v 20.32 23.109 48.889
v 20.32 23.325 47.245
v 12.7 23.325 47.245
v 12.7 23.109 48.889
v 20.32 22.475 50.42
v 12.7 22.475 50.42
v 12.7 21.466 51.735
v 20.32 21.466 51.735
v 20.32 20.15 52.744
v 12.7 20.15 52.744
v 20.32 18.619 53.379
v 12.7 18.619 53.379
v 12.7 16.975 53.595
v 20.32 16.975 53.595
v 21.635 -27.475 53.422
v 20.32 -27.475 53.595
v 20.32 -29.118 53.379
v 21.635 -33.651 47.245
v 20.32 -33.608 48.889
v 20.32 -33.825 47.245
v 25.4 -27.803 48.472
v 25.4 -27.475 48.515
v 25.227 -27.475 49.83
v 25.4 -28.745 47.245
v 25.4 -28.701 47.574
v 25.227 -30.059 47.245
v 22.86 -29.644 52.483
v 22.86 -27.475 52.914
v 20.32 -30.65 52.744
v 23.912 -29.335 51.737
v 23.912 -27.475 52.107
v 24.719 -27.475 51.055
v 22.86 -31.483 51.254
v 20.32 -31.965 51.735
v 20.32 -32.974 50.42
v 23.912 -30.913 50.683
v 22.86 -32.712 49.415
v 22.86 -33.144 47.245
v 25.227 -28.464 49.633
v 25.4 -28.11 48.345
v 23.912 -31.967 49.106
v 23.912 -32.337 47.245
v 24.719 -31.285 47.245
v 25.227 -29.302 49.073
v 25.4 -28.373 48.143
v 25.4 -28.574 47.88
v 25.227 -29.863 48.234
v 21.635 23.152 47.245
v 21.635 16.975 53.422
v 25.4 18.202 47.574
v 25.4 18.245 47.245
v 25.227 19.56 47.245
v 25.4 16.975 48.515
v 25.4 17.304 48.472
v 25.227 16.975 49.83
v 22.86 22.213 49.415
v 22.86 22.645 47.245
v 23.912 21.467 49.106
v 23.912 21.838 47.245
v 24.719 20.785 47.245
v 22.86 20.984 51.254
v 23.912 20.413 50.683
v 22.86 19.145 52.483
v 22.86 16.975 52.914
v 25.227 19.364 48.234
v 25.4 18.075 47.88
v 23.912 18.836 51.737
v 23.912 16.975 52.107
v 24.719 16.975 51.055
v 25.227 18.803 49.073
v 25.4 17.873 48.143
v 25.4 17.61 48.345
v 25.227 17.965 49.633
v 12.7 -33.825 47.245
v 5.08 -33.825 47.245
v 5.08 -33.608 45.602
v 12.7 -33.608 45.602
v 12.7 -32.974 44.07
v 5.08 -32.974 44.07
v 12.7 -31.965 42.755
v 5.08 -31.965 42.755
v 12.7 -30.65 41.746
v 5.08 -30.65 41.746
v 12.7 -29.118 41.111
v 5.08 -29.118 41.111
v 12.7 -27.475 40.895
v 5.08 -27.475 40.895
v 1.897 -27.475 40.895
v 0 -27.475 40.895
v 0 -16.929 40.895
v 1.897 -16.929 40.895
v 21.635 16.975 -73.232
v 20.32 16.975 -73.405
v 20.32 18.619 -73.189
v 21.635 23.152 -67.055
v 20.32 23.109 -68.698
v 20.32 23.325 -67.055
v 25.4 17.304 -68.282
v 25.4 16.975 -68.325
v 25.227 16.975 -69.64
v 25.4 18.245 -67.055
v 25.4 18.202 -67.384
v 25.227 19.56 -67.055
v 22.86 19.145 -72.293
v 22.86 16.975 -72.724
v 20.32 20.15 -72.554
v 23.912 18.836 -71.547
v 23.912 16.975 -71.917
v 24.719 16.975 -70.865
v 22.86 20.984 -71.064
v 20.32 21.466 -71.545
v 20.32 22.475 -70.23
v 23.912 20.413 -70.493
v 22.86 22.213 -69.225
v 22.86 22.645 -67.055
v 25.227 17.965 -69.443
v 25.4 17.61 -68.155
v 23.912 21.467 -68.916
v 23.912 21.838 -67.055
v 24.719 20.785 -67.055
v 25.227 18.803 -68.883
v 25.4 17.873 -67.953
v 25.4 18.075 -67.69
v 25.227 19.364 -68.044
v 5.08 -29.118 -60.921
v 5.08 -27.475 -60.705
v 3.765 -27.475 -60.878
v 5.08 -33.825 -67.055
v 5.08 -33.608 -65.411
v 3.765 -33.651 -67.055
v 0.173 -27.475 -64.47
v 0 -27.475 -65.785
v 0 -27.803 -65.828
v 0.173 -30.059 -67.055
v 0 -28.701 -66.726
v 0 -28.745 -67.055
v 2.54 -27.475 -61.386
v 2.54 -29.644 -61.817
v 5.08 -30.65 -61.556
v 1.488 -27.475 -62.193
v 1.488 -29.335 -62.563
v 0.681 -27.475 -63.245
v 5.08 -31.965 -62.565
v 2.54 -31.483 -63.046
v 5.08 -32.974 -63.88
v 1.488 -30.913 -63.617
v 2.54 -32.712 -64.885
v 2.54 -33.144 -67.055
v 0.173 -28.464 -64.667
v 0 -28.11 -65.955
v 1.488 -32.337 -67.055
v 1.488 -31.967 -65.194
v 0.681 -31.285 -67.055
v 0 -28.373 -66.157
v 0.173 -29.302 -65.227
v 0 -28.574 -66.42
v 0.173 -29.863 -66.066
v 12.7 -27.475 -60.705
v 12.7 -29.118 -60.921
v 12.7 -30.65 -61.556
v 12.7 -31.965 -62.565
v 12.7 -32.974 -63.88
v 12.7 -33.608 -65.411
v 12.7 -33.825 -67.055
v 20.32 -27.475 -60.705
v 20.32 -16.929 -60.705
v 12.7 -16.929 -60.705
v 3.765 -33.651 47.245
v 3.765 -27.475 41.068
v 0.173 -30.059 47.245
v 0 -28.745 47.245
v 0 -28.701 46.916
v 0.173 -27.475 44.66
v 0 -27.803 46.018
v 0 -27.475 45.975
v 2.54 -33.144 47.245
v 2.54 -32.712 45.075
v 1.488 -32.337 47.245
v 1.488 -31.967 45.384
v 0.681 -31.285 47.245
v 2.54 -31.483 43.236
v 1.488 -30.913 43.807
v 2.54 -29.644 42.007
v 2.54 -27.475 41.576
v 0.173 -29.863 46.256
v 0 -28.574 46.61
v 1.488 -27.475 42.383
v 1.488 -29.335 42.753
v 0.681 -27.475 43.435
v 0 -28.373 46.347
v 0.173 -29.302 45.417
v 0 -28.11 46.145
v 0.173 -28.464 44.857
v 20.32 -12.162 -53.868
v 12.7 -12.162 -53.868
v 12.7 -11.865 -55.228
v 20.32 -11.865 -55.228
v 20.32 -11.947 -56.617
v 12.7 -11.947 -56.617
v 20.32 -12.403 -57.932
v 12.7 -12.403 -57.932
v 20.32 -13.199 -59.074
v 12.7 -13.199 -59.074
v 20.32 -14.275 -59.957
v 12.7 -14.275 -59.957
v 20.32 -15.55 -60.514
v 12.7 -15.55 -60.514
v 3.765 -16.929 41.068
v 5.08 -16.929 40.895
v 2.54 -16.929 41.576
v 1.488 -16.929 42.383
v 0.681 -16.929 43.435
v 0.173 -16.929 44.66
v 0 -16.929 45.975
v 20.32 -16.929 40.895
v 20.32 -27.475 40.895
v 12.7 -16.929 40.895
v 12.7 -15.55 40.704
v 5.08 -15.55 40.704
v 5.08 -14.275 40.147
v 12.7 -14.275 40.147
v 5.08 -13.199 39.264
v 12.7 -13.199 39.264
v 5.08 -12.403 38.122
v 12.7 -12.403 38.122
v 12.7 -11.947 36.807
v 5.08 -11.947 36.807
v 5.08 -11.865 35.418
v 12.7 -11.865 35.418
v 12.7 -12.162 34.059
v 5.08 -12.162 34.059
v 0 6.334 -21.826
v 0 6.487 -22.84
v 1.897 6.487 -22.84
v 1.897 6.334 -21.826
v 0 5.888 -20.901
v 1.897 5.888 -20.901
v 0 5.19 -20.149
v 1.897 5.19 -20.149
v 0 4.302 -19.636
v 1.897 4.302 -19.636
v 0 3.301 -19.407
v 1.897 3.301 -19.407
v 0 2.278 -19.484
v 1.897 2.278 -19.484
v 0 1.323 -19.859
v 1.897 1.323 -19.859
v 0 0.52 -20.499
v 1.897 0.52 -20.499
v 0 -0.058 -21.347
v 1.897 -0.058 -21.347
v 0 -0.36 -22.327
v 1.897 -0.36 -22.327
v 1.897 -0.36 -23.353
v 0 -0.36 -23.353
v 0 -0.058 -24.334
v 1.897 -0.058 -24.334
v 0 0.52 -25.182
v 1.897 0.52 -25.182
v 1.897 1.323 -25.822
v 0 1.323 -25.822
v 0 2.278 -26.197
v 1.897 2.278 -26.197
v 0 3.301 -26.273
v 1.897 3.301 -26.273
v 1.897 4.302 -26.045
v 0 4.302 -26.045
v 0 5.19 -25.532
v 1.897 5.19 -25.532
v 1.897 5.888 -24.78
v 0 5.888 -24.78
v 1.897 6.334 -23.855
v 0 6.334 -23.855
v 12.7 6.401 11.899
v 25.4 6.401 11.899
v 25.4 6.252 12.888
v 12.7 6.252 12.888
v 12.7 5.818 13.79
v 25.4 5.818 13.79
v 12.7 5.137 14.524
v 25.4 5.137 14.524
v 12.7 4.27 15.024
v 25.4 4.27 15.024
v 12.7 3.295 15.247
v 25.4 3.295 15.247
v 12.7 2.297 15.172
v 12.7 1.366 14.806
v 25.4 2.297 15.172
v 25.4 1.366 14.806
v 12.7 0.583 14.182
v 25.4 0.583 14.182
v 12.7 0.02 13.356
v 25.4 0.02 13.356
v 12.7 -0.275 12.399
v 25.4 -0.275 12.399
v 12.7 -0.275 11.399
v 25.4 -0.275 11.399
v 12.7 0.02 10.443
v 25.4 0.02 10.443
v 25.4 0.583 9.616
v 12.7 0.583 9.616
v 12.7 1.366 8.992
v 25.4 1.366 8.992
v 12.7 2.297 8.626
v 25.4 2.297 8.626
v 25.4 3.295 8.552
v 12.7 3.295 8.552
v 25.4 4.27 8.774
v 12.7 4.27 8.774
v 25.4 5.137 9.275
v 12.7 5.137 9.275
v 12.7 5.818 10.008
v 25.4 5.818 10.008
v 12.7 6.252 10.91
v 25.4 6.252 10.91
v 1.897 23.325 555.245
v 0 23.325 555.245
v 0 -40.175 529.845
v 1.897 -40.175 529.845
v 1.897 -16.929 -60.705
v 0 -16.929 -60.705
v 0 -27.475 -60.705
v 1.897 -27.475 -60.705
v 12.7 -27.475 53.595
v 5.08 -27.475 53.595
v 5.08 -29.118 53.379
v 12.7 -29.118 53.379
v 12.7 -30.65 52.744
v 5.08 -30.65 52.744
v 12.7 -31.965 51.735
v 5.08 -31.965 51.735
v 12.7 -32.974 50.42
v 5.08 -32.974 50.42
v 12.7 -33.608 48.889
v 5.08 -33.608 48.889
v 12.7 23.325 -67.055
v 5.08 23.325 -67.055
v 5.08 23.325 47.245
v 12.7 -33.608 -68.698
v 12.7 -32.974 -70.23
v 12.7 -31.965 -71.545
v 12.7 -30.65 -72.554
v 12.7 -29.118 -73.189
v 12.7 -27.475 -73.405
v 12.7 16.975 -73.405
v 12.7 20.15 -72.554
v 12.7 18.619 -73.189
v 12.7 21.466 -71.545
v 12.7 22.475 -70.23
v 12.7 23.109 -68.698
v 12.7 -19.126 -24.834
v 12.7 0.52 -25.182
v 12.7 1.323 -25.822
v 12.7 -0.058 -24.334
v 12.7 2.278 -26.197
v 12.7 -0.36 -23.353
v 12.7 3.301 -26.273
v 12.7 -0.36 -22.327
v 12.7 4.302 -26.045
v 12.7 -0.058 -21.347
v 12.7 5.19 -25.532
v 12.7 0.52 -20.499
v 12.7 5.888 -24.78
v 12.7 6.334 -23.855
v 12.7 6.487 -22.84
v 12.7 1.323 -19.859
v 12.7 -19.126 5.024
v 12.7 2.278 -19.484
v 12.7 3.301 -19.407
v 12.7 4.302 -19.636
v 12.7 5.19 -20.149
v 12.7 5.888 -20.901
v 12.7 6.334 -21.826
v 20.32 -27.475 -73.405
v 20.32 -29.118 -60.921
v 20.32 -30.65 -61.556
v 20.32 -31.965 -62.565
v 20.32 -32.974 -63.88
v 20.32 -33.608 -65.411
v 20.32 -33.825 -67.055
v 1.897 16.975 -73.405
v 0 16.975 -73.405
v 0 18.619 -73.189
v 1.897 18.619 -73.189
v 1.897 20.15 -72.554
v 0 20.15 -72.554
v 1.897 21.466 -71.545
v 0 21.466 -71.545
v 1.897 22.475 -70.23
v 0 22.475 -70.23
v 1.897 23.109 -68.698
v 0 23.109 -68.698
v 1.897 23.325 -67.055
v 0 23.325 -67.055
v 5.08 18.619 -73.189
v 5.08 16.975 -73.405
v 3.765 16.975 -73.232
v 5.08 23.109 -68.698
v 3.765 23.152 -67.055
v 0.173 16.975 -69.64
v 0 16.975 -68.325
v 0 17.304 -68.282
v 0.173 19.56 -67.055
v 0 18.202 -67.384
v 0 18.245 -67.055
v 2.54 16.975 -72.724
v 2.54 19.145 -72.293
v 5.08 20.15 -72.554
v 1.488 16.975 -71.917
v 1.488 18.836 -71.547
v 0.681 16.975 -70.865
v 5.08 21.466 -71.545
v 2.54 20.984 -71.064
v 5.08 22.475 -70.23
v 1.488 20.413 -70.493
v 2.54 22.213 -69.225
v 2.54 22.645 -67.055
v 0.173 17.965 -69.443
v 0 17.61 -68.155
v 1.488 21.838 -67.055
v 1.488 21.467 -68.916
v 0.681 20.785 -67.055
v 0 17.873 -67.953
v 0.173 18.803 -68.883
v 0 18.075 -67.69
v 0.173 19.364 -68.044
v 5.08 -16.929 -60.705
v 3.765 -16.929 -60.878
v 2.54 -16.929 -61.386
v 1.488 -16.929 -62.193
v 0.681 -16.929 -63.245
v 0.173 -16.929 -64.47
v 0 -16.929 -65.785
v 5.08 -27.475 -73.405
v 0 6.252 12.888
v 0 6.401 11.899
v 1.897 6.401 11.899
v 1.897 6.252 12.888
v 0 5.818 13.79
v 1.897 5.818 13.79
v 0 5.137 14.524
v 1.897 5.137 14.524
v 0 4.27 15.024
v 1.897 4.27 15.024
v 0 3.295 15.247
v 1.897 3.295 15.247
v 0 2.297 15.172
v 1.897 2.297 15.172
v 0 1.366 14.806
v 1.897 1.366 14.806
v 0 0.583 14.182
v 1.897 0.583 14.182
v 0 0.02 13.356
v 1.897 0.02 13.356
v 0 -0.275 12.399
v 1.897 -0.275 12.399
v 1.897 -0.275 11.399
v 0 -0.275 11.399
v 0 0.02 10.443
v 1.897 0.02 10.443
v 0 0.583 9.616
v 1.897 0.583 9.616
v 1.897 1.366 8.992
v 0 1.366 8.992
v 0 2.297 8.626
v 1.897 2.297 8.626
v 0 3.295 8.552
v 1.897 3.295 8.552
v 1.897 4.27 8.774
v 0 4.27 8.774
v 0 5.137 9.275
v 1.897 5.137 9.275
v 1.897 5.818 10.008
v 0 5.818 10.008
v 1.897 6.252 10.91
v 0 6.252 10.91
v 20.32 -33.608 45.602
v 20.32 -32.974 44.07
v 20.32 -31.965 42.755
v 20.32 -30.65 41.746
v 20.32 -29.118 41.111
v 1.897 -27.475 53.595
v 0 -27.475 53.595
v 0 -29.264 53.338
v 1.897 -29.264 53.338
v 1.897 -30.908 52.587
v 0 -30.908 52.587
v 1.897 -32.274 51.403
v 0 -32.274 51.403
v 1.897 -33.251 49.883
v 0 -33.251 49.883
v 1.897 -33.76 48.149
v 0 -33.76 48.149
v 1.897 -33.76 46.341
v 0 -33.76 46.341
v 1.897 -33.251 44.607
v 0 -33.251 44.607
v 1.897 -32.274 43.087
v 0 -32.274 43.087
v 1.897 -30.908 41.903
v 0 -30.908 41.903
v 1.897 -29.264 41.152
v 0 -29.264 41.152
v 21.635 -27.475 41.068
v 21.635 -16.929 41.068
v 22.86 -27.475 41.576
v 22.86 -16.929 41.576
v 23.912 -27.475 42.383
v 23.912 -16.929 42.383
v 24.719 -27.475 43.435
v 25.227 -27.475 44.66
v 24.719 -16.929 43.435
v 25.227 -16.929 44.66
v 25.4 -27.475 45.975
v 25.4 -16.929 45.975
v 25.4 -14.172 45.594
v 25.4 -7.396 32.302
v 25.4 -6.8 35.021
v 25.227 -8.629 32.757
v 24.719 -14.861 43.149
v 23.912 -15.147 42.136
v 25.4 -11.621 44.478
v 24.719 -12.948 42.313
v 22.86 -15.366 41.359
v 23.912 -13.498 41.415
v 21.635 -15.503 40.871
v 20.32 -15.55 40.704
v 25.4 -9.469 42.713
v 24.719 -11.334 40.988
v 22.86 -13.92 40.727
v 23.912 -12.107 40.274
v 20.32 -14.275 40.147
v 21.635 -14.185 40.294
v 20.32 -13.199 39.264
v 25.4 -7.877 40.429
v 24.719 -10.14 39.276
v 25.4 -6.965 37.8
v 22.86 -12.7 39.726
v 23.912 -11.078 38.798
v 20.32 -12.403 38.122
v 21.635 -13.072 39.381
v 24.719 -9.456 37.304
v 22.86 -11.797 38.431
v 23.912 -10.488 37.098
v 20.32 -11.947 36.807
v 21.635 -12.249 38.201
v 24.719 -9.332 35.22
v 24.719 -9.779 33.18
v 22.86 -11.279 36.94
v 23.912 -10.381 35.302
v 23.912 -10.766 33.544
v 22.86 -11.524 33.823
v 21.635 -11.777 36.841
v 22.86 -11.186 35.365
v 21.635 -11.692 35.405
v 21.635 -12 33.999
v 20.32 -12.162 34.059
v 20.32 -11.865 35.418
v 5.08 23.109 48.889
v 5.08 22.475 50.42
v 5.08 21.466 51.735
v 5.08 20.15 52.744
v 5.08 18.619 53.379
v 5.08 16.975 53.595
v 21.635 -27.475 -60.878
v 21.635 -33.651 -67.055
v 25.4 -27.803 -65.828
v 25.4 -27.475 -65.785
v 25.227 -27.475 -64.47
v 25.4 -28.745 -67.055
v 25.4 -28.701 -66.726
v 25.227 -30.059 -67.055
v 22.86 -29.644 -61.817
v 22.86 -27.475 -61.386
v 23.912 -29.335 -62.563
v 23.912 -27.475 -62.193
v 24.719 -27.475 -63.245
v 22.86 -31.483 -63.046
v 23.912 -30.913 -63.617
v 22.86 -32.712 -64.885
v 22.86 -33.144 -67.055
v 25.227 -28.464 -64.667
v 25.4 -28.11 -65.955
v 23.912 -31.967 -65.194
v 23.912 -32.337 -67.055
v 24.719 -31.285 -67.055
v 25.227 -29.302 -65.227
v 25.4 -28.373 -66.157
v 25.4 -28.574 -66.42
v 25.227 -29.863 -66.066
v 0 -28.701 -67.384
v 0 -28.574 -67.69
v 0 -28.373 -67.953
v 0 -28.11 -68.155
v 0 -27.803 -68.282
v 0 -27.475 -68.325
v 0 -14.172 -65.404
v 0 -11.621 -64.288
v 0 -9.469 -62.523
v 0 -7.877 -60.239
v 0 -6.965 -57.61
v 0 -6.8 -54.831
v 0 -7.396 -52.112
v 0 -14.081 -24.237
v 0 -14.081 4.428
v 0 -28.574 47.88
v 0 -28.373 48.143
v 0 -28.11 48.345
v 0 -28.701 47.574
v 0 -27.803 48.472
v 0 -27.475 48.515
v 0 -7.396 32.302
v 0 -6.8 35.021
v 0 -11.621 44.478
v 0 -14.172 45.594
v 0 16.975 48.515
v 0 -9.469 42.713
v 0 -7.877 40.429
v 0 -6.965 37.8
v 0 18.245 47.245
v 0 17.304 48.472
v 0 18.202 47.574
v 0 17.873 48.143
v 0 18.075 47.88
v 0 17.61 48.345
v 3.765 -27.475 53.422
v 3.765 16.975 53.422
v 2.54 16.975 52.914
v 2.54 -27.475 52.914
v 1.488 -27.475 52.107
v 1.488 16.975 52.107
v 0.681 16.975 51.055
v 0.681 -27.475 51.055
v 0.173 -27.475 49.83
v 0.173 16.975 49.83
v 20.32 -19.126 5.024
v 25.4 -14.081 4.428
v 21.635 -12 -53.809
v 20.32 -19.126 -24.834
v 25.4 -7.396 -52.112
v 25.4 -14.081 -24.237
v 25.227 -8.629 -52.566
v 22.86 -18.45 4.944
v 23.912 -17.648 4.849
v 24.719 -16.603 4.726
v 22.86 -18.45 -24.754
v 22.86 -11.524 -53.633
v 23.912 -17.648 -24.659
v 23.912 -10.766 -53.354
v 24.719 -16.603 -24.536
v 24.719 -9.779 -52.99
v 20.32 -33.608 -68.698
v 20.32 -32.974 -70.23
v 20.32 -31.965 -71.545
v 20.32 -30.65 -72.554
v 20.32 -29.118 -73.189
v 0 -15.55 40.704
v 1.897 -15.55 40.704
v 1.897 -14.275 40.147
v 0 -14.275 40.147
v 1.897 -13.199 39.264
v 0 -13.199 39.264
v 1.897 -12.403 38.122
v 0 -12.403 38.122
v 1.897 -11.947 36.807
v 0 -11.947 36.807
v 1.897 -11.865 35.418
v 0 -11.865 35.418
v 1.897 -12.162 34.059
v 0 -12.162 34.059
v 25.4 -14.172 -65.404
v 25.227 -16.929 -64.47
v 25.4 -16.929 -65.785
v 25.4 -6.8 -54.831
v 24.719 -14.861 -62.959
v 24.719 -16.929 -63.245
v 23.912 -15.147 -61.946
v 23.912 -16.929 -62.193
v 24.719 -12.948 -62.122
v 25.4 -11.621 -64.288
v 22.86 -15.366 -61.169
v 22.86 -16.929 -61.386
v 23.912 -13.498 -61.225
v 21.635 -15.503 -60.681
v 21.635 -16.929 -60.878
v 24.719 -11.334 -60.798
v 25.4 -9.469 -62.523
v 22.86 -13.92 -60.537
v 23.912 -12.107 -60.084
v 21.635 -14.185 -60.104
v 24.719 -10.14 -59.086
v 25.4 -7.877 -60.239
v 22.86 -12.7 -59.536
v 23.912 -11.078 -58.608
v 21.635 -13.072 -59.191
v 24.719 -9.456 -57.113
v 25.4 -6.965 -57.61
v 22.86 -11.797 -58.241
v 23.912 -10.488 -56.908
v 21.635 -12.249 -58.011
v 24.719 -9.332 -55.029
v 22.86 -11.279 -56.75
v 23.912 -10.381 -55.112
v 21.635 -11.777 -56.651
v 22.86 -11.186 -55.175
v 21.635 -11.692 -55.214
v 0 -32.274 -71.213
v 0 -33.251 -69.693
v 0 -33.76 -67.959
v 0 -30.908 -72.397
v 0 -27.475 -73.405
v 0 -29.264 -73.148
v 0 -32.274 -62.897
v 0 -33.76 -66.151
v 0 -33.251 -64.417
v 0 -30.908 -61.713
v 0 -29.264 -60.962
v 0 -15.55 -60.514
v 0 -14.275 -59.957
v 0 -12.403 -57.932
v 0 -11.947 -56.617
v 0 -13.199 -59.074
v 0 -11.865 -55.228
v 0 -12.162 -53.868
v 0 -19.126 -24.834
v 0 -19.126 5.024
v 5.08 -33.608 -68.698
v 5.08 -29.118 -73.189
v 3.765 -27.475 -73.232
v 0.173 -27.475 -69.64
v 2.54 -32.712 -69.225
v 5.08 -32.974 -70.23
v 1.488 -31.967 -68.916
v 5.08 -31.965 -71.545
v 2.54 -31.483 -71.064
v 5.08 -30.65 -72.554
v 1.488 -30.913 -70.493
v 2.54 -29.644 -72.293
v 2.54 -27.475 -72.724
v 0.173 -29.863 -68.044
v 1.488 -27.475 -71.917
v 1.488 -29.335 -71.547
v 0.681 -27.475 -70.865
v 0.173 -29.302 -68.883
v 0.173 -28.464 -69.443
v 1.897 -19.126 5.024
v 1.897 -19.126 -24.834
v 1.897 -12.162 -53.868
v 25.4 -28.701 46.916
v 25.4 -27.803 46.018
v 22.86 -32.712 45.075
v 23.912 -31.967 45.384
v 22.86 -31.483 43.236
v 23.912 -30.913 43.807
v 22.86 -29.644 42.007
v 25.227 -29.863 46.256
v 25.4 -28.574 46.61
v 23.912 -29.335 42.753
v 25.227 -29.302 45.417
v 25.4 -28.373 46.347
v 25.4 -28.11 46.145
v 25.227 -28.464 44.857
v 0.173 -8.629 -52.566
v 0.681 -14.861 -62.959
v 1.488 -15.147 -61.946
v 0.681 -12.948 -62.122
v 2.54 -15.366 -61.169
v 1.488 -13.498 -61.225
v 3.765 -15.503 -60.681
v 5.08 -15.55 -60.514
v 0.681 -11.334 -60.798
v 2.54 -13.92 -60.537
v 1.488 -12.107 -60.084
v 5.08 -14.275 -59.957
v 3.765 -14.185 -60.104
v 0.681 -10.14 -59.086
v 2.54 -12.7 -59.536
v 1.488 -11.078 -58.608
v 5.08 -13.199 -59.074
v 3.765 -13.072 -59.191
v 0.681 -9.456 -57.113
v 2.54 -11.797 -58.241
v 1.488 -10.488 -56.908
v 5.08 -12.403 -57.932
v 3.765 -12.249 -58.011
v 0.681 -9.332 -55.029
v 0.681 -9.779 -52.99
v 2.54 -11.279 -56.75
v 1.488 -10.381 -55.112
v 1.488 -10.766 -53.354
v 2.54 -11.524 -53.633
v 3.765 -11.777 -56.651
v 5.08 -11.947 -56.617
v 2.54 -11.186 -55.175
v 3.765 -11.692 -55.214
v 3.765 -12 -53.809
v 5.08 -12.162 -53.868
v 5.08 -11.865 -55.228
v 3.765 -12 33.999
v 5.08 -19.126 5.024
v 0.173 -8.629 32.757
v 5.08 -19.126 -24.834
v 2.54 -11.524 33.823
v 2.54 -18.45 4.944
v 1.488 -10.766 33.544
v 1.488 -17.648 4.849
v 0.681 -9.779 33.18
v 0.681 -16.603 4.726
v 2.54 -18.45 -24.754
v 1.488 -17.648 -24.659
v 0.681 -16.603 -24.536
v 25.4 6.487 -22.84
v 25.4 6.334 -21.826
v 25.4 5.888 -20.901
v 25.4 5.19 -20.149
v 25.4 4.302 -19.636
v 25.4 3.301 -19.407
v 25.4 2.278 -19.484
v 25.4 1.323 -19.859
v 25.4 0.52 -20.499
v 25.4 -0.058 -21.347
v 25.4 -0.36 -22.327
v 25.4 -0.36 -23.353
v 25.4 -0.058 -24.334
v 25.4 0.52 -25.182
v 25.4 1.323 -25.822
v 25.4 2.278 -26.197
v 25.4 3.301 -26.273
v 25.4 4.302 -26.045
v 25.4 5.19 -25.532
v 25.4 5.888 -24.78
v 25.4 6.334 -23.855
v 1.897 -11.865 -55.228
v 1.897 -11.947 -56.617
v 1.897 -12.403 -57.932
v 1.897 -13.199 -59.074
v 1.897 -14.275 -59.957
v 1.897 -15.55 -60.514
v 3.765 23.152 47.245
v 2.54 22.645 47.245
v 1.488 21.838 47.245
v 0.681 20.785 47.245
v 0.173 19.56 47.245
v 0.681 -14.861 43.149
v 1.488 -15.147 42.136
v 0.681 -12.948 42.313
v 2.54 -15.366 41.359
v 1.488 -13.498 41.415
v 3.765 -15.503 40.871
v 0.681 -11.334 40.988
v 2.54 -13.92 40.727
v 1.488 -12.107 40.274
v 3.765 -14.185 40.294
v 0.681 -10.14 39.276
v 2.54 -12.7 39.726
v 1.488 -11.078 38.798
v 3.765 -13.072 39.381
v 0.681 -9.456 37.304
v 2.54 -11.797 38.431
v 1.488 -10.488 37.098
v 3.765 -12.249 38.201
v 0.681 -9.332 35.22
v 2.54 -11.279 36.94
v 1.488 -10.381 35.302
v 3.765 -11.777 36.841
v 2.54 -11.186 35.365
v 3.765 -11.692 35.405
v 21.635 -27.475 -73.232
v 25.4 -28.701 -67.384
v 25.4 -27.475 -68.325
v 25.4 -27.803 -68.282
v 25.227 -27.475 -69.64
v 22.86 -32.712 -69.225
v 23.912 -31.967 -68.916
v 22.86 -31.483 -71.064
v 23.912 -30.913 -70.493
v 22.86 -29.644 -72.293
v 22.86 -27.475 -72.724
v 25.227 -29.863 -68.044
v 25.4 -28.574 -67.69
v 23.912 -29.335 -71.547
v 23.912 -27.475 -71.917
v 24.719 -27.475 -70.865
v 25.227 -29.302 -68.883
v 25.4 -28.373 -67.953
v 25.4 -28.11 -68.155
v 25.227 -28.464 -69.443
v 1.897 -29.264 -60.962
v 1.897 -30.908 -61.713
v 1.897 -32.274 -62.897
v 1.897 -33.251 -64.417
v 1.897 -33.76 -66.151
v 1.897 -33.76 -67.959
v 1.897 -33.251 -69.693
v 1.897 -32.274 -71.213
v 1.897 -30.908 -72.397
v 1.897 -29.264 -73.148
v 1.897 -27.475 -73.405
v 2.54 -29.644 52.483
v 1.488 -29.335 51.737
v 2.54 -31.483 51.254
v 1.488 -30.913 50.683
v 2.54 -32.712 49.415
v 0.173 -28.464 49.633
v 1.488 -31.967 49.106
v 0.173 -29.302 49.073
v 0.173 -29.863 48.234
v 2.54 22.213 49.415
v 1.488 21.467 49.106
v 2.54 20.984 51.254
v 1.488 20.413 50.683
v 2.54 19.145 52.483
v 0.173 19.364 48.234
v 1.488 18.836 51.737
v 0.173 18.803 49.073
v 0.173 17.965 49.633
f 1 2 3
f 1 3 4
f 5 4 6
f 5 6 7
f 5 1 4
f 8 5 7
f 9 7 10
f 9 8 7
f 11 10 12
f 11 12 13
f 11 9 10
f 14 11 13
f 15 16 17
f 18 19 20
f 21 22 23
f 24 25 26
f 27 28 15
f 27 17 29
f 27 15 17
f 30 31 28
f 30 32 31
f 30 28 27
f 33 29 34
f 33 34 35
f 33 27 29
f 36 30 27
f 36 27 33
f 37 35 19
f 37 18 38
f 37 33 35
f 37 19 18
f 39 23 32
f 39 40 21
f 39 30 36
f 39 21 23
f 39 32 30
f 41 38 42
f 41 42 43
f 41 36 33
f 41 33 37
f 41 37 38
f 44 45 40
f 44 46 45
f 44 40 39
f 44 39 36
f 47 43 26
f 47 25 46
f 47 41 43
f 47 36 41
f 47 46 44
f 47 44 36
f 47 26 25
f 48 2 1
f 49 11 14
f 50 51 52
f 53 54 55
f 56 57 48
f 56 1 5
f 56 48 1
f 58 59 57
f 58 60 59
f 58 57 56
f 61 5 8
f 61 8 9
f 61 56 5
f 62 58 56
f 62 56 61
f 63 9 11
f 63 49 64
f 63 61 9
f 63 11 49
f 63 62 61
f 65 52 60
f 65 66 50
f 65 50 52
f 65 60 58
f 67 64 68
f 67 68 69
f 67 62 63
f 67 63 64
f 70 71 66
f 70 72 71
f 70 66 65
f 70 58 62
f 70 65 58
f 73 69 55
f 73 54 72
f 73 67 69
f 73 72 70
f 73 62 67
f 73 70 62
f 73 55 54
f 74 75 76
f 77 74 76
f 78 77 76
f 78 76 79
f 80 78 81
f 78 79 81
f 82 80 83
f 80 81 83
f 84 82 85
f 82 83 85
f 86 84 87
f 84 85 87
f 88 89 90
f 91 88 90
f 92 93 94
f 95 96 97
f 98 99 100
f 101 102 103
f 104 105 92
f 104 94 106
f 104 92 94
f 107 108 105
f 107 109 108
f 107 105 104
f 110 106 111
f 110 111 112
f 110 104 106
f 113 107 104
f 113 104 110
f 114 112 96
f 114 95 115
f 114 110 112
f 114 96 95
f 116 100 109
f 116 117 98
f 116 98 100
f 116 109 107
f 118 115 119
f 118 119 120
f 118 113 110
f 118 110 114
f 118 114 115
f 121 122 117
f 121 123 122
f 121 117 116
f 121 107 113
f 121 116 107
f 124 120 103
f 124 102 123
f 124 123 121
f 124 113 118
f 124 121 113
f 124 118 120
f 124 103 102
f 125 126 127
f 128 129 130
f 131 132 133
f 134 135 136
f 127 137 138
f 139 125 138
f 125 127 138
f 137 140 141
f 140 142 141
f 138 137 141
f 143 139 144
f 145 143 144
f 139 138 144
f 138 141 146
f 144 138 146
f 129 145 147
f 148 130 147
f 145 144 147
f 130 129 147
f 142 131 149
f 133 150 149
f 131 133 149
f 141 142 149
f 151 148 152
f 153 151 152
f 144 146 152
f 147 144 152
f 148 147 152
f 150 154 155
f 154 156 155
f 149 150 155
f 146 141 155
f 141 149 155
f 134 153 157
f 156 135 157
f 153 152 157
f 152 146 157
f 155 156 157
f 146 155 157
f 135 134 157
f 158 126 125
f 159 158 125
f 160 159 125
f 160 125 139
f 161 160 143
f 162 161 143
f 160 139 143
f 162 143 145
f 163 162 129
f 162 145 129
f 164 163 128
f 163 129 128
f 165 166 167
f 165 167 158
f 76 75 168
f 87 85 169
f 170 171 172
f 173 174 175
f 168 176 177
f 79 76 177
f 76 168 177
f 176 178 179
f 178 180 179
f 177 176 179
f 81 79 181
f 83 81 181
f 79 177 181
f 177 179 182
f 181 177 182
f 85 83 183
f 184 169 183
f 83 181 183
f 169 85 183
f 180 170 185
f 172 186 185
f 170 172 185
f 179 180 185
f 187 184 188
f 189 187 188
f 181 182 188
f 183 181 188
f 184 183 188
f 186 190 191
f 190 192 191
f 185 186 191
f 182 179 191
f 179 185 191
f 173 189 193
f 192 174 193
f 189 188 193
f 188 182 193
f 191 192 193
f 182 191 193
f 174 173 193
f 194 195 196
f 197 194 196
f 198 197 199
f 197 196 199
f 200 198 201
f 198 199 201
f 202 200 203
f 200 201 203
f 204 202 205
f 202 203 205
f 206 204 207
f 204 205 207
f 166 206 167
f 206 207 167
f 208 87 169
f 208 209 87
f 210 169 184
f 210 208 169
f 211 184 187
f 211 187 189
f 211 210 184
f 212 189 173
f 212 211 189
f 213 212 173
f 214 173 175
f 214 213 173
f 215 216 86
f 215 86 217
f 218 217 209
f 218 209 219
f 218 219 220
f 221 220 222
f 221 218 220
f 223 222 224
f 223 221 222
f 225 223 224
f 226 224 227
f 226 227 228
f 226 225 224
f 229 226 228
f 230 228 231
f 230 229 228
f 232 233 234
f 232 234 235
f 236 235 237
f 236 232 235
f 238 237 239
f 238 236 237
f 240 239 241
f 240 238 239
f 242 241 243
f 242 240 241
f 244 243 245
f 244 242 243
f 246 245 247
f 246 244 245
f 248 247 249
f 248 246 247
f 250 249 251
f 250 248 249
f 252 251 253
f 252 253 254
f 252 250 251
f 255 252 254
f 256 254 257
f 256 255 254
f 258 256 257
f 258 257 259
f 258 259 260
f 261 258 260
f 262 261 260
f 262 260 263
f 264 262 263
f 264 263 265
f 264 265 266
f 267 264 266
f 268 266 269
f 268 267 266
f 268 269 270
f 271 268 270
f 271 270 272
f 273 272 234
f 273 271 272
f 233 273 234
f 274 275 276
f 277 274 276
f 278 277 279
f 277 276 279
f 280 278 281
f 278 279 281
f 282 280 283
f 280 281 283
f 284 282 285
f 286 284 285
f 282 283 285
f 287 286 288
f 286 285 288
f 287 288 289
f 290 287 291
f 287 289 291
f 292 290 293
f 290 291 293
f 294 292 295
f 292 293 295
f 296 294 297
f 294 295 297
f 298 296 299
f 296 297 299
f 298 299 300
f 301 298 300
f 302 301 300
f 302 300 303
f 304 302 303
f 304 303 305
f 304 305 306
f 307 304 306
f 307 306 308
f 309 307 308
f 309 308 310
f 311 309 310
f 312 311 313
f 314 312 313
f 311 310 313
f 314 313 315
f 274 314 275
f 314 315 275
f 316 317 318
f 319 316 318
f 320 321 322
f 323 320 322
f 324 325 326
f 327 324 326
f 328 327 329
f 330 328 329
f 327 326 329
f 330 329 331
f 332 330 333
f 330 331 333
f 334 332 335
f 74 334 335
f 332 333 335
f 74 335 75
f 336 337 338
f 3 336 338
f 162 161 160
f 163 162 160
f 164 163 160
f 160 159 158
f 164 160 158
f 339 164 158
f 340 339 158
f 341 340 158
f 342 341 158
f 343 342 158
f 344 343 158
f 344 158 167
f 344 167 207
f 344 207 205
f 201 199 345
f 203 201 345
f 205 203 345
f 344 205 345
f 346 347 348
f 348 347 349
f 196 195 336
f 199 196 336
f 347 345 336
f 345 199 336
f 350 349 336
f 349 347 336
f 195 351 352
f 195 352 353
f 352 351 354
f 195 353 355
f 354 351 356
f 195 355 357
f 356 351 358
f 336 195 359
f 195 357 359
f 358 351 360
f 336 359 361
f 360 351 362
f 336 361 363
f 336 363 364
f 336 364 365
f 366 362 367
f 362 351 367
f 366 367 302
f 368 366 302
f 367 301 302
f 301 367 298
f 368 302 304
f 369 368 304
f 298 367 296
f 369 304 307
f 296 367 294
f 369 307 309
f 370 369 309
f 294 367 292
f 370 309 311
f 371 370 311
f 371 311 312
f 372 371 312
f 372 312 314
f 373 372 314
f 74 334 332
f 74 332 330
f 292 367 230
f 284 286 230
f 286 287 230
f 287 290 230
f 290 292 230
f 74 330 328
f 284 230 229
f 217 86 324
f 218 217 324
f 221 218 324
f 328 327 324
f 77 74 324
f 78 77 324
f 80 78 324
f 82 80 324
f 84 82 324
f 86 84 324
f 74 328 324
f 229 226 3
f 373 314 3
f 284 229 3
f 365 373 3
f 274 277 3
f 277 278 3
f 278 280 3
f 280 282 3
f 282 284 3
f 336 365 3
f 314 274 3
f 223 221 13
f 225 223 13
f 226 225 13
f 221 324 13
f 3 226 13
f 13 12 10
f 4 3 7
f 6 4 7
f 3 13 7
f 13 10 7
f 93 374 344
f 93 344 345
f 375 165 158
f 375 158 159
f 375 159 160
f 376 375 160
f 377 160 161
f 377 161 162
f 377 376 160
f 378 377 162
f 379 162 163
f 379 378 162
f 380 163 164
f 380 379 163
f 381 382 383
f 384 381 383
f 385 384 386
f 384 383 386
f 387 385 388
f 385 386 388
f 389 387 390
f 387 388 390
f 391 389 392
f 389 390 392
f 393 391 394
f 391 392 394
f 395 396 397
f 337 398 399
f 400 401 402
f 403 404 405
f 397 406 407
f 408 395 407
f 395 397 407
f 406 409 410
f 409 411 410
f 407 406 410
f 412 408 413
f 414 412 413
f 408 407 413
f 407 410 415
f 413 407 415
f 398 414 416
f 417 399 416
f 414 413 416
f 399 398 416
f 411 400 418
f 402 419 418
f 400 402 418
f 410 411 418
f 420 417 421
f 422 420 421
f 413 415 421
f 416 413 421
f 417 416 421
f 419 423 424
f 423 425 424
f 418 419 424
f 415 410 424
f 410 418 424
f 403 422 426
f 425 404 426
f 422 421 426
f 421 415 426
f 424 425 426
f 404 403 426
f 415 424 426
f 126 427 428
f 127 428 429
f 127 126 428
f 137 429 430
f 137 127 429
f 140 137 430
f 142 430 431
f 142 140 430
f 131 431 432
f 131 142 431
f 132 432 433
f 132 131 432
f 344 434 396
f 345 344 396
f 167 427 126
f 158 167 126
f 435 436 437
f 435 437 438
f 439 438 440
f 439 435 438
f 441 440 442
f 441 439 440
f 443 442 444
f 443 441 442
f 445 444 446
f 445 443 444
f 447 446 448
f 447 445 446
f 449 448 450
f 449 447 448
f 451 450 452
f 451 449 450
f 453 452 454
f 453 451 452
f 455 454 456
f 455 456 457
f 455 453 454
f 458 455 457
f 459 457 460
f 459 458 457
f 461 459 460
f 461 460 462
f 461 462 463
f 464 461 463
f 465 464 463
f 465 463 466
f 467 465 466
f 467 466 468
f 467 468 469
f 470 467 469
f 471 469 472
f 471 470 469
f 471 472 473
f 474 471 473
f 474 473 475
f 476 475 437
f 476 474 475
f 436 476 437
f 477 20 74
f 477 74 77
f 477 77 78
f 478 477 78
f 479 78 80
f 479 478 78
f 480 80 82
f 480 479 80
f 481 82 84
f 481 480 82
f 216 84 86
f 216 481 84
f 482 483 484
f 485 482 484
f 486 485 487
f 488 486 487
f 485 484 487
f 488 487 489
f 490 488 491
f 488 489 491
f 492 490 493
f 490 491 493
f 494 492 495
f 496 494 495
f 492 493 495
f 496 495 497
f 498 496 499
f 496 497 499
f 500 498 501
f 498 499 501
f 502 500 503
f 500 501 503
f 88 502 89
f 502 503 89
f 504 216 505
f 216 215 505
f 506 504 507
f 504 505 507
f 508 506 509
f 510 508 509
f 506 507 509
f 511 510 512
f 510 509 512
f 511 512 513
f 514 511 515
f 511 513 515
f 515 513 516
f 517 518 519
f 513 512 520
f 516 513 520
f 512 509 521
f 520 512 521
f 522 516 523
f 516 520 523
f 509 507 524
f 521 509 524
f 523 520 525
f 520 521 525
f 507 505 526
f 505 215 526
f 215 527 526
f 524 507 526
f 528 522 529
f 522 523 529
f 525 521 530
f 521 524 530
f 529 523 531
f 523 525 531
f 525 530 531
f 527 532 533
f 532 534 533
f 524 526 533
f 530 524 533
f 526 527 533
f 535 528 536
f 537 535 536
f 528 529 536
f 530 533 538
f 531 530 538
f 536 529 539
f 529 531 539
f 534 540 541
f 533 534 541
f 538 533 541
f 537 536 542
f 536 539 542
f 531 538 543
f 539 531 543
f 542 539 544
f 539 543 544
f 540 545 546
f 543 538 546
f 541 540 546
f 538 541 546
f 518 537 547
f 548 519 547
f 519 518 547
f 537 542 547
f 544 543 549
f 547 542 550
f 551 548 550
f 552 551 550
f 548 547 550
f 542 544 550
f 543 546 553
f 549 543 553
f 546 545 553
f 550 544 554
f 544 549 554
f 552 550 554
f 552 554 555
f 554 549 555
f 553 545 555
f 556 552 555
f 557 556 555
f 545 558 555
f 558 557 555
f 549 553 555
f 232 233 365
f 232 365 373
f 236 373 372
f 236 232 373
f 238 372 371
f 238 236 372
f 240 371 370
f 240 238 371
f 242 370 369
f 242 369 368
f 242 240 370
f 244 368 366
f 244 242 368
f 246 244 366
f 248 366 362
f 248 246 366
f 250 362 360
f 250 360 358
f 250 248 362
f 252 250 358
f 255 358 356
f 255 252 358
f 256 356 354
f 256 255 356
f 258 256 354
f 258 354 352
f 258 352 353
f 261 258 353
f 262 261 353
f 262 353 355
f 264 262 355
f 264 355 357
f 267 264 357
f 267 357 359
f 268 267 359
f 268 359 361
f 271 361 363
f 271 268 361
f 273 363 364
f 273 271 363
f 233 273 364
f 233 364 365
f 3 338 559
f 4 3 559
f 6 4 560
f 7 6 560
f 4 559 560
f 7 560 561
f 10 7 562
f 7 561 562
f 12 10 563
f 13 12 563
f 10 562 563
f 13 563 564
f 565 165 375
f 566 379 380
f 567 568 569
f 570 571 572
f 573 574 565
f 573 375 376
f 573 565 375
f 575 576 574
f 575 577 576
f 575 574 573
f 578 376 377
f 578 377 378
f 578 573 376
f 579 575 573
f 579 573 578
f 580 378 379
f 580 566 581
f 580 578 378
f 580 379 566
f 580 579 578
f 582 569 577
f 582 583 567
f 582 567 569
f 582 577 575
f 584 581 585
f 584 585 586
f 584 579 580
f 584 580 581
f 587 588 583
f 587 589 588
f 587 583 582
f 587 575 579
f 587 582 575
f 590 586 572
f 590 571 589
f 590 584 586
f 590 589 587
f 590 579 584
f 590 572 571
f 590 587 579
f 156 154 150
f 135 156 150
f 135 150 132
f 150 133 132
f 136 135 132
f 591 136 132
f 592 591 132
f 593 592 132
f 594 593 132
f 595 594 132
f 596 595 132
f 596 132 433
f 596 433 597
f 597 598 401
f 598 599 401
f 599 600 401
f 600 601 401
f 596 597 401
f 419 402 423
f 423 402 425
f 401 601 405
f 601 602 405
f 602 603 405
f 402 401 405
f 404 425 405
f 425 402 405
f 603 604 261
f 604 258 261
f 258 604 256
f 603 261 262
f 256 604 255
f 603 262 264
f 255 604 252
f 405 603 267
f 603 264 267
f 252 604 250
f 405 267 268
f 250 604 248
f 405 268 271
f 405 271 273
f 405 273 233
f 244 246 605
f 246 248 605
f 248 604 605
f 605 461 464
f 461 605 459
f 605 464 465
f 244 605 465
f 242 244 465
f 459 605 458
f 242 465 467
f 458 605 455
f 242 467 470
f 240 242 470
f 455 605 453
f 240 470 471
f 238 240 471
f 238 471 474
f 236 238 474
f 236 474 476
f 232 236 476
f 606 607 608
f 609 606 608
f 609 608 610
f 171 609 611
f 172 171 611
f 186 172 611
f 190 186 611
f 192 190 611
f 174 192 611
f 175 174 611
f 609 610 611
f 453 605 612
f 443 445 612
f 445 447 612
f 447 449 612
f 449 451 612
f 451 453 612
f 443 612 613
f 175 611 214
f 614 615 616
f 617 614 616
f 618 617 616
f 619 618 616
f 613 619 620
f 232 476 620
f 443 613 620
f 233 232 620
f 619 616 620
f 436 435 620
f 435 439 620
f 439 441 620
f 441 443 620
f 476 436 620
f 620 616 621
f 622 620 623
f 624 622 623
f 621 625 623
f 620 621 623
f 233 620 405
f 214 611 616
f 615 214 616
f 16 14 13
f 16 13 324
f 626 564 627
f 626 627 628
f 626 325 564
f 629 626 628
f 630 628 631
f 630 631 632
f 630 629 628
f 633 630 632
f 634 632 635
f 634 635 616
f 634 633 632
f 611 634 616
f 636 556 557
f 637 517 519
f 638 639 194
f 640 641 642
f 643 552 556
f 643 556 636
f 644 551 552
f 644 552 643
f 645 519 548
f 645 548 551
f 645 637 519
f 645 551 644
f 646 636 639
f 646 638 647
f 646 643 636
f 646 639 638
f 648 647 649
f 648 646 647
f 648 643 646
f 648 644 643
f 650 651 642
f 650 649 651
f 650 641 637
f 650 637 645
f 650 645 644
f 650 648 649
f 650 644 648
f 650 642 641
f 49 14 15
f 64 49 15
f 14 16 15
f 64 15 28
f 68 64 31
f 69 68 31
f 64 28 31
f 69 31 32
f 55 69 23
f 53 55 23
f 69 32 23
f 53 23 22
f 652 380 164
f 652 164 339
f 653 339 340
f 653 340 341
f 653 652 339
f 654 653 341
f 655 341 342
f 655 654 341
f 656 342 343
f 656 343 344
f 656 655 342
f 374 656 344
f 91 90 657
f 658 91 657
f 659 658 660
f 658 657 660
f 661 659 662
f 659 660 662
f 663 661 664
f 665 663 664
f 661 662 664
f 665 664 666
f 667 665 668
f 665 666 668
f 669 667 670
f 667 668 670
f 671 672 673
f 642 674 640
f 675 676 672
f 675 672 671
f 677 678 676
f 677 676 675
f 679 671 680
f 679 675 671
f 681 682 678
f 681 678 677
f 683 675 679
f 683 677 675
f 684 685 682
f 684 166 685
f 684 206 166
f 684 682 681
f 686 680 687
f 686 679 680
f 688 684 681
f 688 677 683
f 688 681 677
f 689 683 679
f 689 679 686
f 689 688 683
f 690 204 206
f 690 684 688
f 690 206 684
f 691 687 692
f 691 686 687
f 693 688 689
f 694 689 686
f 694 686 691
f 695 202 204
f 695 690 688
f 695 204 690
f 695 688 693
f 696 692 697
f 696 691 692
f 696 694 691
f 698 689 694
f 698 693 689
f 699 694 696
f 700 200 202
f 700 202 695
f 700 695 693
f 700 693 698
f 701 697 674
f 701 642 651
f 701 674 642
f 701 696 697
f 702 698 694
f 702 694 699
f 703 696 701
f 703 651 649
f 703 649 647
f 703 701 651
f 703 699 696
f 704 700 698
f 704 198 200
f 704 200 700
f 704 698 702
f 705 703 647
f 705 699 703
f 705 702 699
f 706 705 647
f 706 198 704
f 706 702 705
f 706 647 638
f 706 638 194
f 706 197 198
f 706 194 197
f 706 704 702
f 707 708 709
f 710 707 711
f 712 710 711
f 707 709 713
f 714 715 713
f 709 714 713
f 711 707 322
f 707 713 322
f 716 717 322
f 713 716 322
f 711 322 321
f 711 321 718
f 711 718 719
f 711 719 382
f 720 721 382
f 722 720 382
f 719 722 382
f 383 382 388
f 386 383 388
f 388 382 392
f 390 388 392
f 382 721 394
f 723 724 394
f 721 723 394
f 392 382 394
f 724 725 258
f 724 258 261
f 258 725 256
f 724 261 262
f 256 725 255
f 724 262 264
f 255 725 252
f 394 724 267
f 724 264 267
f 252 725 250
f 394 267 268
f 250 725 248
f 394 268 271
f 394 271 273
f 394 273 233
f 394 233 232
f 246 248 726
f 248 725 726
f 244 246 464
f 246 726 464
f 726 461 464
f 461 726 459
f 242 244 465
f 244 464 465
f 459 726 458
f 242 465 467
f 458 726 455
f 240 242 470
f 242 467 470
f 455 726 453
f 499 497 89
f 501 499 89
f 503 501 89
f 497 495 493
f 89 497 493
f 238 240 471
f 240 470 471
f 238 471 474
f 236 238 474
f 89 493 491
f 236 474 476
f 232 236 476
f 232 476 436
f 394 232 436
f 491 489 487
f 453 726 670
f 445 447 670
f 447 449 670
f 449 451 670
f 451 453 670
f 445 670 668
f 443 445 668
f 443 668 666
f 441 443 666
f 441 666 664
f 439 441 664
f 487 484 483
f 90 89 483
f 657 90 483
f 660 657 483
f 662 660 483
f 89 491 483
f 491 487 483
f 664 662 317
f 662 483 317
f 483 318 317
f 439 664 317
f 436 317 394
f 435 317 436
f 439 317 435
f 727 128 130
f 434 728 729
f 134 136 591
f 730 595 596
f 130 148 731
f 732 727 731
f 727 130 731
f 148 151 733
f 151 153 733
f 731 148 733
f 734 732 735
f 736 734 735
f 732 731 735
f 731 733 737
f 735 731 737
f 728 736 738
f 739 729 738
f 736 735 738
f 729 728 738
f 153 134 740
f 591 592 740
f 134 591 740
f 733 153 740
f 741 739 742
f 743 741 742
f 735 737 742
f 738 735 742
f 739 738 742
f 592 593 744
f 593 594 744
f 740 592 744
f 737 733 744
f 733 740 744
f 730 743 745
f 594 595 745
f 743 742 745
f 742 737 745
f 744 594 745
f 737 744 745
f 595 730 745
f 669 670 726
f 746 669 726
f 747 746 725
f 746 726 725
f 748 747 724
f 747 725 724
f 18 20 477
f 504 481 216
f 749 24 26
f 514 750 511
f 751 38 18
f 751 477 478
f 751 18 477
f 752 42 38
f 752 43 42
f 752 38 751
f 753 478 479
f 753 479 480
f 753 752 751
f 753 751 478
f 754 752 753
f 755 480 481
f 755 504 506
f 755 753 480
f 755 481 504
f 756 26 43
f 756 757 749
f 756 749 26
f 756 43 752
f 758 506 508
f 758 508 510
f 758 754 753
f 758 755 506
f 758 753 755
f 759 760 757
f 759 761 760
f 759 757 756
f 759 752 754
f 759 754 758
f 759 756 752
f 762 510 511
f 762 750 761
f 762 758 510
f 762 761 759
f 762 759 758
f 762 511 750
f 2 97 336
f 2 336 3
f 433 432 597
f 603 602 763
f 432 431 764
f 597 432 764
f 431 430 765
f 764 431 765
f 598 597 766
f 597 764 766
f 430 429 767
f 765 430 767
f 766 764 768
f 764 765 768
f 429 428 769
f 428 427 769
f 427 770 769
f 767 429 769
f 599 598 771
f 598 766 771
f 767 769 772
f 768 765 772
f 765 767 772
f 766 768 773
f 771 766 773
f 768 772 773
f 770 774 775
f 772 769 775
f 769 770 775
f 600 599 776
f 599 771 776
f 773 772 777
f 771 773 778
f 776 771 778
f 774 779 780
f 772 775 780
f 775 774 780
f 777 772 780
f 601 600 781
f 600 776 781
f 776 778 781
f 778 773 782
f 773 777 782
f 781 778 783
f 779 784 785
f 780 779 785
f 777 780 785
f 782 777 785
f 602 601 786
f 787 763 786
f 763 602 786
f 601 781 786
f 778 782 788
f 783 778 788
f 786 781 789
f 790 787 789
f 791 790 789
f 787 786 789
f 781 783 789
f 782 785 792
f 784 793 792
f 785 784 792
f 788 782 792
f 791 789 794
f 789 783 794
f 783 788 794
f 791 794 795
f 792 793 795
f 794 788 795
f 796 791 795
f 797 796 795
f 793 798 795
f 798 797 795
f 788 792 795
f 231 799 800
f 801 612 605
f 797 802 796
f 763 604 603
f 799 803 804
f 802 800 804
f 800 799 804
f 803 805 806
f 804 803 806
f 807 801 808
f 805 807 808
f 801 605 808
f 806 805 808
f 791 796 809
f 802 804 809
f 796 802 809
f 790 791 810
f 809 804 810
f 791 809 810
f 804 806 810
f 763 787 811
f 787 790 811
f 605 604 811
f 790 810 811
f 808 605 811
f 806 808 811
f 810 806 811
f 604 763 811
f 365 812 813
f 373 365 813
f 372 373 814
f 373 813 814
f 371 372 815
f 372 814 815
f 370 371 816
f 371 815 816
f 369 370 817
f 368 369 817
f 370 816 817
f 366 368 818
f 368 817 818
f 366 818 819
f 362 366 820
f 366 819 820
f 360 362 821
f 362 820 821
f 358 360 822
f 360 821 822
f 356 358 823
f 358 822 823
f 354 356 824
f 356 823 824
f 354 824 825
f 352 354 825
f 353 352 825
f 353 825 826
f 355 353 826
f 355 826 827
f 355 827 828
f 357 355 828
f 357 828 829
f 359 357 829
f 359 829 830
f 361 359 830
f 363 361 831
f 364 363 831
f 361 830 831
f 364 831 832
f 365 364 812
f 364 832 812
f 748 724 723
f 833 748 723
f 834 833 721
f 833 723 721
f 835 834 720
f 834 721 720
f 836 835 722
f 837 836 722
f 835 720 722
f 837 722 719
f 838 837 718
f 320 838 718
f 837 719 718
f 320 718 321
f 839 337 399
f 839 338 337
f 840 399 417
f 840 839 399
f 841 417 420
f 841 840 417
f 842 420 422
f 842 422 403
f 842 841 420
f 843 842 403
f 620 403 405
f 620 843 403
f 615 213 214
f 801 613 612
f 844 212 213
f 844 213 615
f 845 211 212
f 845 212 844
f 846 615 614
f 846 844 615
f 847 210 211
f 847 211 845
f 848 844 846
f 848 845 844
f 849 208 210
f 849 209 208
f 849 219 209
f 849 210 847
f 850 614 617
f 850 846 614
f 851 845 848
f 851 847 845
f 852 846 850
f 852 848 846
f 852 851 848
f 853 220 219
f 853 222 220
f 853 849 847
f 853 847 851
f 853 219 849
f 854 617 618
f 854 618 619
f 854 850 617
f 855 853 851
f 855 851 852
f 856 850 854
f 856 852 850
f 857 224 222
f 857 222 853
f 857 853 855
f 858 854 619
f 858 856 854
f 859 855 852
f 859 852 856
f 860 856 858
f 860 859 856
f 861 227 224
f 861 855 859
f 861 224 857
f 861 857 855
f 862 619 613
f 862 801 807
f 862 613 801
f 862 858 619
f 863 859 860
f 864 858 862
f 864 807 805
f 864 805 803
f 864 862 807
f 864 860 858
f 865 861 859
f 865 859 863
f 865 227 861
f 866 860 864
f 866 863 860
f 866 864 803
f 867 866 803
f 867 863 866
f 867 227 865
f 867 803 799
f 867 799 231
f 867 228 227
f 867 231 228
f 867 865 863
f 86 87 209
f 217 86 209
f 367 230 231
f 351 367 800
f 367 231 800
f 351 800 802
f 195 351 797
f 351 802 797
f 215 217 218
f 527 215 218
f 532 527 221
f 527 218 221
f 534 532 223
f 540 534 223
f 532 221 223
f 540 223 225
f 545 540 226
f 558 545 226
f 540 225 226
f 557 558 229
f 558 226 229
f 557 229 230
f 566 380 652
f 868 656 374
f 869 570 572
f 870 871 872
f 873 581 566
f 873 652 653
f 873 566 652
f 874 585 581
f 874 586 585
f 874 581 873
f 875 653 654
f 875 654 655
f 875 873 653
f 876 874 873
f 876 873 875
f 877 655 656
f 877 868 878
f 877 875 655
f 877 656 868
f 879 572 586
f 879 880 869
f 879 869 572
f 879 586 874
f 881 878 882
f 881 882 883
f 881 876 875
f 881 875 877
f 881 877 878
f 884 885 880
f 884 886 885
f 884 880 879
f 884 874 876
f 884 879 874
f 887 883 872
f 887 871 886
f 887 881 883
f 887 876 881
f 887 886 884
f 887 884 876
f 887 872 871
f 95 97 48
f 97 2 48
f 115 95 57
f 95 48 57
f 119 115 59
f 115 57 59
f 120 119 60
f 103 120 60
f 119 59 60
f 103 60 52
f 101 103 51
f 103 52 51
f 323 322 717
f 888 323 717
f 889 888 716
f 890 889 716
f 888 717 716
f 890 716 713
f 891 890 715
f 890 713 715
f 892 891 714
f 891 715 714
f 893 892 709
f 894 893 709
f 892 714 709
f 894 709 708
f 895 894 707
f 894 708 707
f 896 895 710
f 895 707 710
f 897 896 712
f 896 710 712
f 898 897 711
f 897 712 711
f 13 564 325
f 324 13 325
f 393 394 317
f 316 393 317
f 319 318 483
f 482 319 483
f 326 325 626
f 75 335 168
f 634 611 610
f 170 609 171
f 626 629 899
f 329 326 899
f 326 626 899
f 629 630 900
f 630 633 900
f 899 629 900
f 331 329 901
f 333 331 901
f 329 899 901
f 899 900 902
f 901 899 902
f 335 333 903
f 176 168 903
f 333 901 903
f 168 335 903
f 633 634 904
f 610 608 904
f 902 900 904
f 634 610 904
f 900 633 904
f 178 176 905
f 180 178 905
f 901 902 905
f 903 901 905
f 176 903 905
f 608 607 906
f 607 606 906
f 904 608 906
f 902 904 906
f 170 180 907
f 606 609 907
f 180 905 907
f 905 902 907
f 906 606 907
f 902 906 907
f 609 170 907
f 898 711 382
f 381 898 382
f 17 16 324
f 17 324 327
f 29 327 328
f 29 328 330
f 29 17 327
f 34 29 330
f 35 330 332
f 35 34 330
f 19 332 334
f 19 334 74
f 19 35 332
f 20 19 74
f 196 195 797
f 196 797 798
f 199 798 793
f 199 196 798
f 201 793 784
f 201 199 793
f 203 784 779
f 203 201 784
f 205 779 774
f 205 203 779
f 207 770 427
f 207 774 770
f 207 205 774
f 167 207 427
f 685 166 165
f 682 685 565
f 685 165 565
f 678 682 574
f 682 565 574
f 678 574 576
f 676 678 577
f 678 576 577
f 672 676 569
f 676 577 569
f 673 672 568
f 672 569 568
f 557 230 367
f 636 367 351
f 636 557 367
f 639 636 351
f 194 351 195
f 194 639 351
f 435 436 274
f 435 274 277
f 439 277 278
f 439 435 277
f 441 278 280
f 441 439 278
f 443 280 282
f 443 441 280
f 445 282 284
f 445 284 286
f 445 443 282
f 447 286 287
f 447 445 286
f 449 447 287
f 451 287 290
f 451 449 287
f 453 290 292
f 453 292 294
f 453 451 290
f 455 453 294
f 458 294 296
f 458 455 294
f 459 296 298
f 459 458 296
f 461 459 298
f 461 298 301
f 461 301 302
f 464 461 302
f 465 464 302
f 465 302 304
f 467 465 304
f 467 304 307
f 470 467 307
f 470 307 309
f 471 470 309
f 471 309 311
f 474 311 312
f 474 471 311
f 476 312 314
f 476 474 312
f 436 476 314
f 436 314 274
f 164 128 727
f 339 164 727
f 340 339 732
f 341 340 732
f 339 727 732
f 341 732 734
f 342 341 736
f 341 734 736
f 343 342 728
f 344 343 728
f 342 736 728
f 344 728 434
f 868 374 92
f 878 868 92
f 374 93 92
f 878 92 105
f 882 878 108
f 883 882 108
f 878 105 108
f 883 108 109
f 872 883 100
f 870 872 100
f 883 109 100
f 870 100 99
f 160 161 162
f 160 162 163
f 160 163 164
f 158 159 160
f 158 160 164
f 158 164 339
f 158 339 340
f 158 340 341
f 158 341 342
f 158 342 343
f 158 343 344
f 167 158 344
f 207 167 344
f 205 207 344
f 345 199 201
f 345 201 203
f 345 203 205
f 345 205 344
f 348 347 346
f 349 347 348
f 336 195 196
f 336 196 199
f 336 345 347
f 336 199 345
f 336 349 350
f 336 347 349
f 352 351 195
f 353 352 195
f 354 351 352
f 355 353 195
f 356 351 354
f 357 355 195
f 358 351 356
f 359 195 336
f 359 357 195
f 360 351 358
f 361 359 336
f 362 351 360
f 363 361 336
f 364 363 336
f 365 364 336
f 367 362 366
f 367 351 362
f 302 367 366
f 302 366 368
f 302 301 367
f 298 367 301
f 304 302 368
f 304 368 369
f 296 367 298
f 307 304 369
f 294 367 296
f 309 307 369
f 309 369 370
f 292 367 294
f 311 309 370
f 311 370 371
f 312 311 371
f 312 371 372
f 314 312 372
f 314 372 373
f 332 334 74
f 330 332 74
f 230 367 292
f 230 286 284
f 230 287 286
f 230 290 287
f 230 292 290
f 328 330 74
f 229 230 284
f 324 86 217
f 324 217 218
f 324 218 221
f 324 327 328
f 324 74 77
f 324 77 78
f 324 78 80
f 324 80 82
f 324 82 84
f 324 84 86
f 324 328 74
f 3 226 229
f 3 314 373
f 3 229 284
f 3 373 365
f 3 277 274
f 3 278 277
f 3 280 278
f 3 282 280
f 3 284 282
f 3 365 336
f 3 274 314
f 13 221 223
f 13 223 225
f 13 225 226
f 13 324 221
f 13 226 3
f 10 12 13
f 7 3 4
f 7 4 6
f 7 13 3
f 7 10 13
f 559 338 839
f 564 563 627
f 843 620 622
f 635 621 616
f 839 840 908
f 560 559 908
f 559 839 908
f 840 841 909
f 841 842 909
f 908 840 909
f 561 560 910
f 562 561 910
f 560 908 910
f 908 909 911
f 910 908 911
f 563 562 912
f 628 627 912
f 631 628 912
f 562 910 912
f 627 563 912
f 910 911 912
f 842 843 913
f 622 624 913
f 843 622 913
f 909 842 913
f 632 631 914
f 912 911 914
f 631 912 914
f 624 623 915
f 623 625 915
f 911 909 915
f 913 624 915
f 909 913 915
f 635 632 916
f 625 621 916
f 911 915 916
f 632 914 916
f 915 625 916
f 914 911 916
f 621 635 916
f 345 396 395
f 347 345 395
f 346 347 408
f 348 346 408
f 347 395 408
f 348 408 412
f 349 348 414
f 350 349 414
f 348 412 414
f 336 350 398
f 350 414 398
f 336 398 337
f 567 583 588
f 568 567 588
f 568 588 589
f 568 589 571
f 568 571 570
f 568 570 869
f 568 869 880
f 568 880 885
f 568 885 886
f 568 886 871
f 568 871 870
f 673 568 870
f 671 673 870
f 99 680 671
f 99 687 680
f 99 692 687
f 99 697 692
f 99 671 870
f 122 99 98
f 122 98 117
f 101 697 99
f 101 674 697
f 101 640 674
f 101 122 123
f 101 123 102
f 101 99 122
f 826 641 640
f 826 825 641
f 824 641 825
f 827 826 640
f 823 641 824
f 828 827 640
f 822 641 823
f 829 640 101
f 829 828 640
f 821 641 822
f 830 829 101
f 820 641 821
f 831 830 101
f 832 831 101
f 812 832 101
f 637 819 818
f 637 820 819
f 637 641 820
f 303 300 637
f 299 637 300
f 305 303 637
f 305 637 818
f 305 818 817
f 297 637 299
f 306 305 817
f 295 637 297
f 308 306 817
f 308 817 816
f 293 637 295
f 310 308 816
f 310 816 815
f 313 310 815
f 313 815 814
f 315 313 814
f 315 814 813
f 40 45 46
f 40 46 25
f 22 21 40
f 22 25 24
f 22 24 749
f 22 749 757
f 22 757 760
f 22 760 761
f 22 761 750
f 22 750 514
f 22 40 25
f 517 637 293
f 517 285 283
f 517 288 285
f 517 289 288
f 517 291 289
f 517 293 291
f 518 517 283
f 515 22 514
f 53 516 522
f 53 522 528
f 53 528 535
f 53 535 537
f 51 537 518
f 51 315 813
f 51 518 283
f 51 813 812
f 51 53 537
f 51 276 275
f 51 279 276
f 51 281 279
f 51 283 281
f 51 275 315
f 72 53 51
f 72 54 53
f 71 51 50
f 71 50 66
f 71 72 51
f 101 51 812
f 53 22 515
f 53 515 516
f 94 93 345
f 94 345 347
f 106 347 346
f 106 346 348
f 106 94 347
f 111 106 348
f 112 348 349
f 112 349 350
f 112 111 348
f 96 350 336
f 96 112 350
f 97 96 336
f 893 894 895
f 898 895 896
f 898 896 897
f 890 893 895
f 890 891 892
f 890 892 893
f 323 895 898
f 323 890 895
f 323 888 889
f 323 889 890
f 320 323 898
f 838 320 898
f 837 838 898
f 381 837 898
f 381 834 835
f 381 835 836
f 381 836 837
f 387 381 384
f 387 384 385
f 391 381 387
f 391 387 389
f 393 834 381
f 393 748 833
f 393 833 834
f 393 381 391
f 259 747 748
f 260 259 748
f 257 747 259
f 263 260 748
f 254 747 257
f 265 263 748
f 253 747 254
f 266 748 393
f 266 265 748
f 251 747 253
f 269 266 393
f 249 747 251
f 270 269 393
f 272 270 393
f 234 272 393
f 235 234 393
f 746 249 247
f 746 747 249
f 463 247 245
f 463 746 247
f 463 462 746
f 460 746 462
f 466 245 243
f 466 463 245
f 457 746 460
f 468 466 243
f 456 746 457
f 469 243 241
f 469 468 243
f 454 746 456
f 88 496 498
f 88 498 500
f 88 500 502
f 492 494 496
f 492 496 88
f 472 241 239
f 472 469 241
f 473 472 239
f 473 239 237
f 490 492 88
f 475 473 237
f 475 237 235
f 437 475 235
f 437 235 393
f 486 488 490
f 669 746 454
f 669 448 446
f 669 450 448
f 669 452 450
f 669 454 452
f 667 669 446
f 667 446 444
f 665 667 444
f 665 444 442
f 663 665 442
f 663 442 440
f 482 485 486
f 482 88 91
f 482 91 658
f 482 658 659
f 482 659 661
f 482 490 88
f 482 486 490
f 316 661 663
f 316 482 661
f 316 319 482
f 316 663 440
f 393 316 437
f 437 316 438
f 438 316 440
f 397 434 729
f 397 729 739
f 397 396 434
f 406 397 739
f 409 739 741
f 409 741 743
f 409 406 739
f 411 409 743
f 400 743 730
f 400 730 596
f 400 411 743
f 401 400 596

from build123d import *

# Parameters (mm, degrees)
F0_R     = 3.442574
F0_R_2   = 3.35685
F1_DEPTH = 12.7
F2_R     = 5.08
F4_R     = 3.442574
F4_R_2   = 3.35685
F5_DEPTH = 1.89738


with BuildPart() as f1:
    # F0 (on Right) → F1 (new body)
    with BuildSketch(Plane.YZ):
        with BuildLine():
            Line((23.325471, -67.054919), (23.325471, 47.245081))
            ThreePointArc((23.325471, 47.245081), (21.465599, 51.73521), (16.975471, 53.595081))
            Line((16.975471, 53.595081), (-27.474529, 53.595081))
            ThreePointArc((-27.474529, 53.595081), (-31.964657, 51.73521), (-33.824529, 47.245081))
            ThreePointArc((-33.824529, 47.245081), (-31.964657, 42.754953), (-27.474529, 40.895081))
            Line((-27.474529, 40.895081), (-9.415587, 40.895081))
            Line((-9.415587, 40.895081), (-9.415587, -60.704919))
            Line((-9.415587, -60.704919), (-27.474529, -60.704919))
            ThreePointArc((-27.474529, -60.704919), (-31.964657, -62.56479), (-33.824529, -67.054919))
            ThreePointArc((-33.824529, -67.054919), (-31.964657, -71.545047), (-27.474529, -73.404919))
            Line((-27.474529, -73.404919), (16.975471, -73.404919))
            ThreePointArc((16.975471, -73.404919), (21.465599, -71.545047), (23.325471, -67.054919))
        make_face()
        with Locations((3.043987, -22.84038)):
            Circle(F0_R, mode=Mode.SUBTRACT)
        with Locations((3.043987, 11.899044)):
            Circle(F0_R_2, mode=Mode.SUBTRACT)
        with BuildLine():
            Line((-9.415587, -60.704919), (-9.415587, 40.895081))
            ThreePointArc((-9.415587, 40.895081), (-20.005104, -9.904919), (-9.415587, -60.704919))
        make_face()
    extrude(amount=F1_DEPTH)

    # F2
    f2_edges = [f1.edges().sort_by_distance(p)[0] for p in [
        (0, -5.249529, 53.595081),
        (0, -20.005104, -9.904919),
        (6.35, -9.415587, 40.895081),
        (6.35, -9.415587, -60.704919),
    ]]
    fillet(f2_edges, radius=F2_R)


with BuildPart() as f3_1:
    # F3: instance of F1
    add(f1.part.mirror(Plane(origin=(12.7, 1.082307, -9.958647), x_dir=(0, 1, 0), z_dir=(1, 0, 0))))


with BuildPart() as f5:
    # F4 (on Right) → F5 (new body)
    with BuildSketch(Plane.YZ):
        with BuildLine():
            ThreePointArc((-27.474529, 53.595081), (-33.824529, 47.245081), (-27.474529, 40.895081))
            Line((-27.474529, 40.895081), (-16.929072, 40.895081))
            ThreePointArc((-16.929072, 40.895081), (-12.761958, 38.720517), (-12.162425, 34.058529))
            ThreePointArc((-12.162425, 34.058529), (-20.005104, -9.904919), (-12.162425, -53.868366))
            ThreePointArc((-12.162425, -53.868366), (-12.761958, -58.530354), (-16.929072, -60.704919))
            Line((-16.929072, -60.704919), (-27.474529, -60.704919))
            ThreePointArc((-27.474529, -60.704919), (-33.824529, -67.054919), (-27.474529, -73.404919))
            Line((-27.474529, -73.404919), (16.975471, -73.404919))
            ThreePointArc((16.975471, -73.404919), (21.465599, -71.545047), (23.325471, -67.054919))
            Line((23.325471, -67.054919), (23.325471, 47.245081))
            Line((23.325471, 47.245081), (23.325471, 555.245081))
            Line((23.325471, 555.245081), (-40.174529, 529.845081))
            Line((-40.174529, 529.845081), (-27.474529, 53.595081))
        make_face()
        with Locations((3.043987, -22.84038)):
            Circle(F4_R, mode=Mode.SUBTRACT)
        with Locations((3.043987, 11.899044)):
            Circle(F4_R_2, mode=Mode.SUBTRACT)
    extrude(amount=F5_DEPTH)


solid = Compound([f1.part, f3_1.part, f5.part])
